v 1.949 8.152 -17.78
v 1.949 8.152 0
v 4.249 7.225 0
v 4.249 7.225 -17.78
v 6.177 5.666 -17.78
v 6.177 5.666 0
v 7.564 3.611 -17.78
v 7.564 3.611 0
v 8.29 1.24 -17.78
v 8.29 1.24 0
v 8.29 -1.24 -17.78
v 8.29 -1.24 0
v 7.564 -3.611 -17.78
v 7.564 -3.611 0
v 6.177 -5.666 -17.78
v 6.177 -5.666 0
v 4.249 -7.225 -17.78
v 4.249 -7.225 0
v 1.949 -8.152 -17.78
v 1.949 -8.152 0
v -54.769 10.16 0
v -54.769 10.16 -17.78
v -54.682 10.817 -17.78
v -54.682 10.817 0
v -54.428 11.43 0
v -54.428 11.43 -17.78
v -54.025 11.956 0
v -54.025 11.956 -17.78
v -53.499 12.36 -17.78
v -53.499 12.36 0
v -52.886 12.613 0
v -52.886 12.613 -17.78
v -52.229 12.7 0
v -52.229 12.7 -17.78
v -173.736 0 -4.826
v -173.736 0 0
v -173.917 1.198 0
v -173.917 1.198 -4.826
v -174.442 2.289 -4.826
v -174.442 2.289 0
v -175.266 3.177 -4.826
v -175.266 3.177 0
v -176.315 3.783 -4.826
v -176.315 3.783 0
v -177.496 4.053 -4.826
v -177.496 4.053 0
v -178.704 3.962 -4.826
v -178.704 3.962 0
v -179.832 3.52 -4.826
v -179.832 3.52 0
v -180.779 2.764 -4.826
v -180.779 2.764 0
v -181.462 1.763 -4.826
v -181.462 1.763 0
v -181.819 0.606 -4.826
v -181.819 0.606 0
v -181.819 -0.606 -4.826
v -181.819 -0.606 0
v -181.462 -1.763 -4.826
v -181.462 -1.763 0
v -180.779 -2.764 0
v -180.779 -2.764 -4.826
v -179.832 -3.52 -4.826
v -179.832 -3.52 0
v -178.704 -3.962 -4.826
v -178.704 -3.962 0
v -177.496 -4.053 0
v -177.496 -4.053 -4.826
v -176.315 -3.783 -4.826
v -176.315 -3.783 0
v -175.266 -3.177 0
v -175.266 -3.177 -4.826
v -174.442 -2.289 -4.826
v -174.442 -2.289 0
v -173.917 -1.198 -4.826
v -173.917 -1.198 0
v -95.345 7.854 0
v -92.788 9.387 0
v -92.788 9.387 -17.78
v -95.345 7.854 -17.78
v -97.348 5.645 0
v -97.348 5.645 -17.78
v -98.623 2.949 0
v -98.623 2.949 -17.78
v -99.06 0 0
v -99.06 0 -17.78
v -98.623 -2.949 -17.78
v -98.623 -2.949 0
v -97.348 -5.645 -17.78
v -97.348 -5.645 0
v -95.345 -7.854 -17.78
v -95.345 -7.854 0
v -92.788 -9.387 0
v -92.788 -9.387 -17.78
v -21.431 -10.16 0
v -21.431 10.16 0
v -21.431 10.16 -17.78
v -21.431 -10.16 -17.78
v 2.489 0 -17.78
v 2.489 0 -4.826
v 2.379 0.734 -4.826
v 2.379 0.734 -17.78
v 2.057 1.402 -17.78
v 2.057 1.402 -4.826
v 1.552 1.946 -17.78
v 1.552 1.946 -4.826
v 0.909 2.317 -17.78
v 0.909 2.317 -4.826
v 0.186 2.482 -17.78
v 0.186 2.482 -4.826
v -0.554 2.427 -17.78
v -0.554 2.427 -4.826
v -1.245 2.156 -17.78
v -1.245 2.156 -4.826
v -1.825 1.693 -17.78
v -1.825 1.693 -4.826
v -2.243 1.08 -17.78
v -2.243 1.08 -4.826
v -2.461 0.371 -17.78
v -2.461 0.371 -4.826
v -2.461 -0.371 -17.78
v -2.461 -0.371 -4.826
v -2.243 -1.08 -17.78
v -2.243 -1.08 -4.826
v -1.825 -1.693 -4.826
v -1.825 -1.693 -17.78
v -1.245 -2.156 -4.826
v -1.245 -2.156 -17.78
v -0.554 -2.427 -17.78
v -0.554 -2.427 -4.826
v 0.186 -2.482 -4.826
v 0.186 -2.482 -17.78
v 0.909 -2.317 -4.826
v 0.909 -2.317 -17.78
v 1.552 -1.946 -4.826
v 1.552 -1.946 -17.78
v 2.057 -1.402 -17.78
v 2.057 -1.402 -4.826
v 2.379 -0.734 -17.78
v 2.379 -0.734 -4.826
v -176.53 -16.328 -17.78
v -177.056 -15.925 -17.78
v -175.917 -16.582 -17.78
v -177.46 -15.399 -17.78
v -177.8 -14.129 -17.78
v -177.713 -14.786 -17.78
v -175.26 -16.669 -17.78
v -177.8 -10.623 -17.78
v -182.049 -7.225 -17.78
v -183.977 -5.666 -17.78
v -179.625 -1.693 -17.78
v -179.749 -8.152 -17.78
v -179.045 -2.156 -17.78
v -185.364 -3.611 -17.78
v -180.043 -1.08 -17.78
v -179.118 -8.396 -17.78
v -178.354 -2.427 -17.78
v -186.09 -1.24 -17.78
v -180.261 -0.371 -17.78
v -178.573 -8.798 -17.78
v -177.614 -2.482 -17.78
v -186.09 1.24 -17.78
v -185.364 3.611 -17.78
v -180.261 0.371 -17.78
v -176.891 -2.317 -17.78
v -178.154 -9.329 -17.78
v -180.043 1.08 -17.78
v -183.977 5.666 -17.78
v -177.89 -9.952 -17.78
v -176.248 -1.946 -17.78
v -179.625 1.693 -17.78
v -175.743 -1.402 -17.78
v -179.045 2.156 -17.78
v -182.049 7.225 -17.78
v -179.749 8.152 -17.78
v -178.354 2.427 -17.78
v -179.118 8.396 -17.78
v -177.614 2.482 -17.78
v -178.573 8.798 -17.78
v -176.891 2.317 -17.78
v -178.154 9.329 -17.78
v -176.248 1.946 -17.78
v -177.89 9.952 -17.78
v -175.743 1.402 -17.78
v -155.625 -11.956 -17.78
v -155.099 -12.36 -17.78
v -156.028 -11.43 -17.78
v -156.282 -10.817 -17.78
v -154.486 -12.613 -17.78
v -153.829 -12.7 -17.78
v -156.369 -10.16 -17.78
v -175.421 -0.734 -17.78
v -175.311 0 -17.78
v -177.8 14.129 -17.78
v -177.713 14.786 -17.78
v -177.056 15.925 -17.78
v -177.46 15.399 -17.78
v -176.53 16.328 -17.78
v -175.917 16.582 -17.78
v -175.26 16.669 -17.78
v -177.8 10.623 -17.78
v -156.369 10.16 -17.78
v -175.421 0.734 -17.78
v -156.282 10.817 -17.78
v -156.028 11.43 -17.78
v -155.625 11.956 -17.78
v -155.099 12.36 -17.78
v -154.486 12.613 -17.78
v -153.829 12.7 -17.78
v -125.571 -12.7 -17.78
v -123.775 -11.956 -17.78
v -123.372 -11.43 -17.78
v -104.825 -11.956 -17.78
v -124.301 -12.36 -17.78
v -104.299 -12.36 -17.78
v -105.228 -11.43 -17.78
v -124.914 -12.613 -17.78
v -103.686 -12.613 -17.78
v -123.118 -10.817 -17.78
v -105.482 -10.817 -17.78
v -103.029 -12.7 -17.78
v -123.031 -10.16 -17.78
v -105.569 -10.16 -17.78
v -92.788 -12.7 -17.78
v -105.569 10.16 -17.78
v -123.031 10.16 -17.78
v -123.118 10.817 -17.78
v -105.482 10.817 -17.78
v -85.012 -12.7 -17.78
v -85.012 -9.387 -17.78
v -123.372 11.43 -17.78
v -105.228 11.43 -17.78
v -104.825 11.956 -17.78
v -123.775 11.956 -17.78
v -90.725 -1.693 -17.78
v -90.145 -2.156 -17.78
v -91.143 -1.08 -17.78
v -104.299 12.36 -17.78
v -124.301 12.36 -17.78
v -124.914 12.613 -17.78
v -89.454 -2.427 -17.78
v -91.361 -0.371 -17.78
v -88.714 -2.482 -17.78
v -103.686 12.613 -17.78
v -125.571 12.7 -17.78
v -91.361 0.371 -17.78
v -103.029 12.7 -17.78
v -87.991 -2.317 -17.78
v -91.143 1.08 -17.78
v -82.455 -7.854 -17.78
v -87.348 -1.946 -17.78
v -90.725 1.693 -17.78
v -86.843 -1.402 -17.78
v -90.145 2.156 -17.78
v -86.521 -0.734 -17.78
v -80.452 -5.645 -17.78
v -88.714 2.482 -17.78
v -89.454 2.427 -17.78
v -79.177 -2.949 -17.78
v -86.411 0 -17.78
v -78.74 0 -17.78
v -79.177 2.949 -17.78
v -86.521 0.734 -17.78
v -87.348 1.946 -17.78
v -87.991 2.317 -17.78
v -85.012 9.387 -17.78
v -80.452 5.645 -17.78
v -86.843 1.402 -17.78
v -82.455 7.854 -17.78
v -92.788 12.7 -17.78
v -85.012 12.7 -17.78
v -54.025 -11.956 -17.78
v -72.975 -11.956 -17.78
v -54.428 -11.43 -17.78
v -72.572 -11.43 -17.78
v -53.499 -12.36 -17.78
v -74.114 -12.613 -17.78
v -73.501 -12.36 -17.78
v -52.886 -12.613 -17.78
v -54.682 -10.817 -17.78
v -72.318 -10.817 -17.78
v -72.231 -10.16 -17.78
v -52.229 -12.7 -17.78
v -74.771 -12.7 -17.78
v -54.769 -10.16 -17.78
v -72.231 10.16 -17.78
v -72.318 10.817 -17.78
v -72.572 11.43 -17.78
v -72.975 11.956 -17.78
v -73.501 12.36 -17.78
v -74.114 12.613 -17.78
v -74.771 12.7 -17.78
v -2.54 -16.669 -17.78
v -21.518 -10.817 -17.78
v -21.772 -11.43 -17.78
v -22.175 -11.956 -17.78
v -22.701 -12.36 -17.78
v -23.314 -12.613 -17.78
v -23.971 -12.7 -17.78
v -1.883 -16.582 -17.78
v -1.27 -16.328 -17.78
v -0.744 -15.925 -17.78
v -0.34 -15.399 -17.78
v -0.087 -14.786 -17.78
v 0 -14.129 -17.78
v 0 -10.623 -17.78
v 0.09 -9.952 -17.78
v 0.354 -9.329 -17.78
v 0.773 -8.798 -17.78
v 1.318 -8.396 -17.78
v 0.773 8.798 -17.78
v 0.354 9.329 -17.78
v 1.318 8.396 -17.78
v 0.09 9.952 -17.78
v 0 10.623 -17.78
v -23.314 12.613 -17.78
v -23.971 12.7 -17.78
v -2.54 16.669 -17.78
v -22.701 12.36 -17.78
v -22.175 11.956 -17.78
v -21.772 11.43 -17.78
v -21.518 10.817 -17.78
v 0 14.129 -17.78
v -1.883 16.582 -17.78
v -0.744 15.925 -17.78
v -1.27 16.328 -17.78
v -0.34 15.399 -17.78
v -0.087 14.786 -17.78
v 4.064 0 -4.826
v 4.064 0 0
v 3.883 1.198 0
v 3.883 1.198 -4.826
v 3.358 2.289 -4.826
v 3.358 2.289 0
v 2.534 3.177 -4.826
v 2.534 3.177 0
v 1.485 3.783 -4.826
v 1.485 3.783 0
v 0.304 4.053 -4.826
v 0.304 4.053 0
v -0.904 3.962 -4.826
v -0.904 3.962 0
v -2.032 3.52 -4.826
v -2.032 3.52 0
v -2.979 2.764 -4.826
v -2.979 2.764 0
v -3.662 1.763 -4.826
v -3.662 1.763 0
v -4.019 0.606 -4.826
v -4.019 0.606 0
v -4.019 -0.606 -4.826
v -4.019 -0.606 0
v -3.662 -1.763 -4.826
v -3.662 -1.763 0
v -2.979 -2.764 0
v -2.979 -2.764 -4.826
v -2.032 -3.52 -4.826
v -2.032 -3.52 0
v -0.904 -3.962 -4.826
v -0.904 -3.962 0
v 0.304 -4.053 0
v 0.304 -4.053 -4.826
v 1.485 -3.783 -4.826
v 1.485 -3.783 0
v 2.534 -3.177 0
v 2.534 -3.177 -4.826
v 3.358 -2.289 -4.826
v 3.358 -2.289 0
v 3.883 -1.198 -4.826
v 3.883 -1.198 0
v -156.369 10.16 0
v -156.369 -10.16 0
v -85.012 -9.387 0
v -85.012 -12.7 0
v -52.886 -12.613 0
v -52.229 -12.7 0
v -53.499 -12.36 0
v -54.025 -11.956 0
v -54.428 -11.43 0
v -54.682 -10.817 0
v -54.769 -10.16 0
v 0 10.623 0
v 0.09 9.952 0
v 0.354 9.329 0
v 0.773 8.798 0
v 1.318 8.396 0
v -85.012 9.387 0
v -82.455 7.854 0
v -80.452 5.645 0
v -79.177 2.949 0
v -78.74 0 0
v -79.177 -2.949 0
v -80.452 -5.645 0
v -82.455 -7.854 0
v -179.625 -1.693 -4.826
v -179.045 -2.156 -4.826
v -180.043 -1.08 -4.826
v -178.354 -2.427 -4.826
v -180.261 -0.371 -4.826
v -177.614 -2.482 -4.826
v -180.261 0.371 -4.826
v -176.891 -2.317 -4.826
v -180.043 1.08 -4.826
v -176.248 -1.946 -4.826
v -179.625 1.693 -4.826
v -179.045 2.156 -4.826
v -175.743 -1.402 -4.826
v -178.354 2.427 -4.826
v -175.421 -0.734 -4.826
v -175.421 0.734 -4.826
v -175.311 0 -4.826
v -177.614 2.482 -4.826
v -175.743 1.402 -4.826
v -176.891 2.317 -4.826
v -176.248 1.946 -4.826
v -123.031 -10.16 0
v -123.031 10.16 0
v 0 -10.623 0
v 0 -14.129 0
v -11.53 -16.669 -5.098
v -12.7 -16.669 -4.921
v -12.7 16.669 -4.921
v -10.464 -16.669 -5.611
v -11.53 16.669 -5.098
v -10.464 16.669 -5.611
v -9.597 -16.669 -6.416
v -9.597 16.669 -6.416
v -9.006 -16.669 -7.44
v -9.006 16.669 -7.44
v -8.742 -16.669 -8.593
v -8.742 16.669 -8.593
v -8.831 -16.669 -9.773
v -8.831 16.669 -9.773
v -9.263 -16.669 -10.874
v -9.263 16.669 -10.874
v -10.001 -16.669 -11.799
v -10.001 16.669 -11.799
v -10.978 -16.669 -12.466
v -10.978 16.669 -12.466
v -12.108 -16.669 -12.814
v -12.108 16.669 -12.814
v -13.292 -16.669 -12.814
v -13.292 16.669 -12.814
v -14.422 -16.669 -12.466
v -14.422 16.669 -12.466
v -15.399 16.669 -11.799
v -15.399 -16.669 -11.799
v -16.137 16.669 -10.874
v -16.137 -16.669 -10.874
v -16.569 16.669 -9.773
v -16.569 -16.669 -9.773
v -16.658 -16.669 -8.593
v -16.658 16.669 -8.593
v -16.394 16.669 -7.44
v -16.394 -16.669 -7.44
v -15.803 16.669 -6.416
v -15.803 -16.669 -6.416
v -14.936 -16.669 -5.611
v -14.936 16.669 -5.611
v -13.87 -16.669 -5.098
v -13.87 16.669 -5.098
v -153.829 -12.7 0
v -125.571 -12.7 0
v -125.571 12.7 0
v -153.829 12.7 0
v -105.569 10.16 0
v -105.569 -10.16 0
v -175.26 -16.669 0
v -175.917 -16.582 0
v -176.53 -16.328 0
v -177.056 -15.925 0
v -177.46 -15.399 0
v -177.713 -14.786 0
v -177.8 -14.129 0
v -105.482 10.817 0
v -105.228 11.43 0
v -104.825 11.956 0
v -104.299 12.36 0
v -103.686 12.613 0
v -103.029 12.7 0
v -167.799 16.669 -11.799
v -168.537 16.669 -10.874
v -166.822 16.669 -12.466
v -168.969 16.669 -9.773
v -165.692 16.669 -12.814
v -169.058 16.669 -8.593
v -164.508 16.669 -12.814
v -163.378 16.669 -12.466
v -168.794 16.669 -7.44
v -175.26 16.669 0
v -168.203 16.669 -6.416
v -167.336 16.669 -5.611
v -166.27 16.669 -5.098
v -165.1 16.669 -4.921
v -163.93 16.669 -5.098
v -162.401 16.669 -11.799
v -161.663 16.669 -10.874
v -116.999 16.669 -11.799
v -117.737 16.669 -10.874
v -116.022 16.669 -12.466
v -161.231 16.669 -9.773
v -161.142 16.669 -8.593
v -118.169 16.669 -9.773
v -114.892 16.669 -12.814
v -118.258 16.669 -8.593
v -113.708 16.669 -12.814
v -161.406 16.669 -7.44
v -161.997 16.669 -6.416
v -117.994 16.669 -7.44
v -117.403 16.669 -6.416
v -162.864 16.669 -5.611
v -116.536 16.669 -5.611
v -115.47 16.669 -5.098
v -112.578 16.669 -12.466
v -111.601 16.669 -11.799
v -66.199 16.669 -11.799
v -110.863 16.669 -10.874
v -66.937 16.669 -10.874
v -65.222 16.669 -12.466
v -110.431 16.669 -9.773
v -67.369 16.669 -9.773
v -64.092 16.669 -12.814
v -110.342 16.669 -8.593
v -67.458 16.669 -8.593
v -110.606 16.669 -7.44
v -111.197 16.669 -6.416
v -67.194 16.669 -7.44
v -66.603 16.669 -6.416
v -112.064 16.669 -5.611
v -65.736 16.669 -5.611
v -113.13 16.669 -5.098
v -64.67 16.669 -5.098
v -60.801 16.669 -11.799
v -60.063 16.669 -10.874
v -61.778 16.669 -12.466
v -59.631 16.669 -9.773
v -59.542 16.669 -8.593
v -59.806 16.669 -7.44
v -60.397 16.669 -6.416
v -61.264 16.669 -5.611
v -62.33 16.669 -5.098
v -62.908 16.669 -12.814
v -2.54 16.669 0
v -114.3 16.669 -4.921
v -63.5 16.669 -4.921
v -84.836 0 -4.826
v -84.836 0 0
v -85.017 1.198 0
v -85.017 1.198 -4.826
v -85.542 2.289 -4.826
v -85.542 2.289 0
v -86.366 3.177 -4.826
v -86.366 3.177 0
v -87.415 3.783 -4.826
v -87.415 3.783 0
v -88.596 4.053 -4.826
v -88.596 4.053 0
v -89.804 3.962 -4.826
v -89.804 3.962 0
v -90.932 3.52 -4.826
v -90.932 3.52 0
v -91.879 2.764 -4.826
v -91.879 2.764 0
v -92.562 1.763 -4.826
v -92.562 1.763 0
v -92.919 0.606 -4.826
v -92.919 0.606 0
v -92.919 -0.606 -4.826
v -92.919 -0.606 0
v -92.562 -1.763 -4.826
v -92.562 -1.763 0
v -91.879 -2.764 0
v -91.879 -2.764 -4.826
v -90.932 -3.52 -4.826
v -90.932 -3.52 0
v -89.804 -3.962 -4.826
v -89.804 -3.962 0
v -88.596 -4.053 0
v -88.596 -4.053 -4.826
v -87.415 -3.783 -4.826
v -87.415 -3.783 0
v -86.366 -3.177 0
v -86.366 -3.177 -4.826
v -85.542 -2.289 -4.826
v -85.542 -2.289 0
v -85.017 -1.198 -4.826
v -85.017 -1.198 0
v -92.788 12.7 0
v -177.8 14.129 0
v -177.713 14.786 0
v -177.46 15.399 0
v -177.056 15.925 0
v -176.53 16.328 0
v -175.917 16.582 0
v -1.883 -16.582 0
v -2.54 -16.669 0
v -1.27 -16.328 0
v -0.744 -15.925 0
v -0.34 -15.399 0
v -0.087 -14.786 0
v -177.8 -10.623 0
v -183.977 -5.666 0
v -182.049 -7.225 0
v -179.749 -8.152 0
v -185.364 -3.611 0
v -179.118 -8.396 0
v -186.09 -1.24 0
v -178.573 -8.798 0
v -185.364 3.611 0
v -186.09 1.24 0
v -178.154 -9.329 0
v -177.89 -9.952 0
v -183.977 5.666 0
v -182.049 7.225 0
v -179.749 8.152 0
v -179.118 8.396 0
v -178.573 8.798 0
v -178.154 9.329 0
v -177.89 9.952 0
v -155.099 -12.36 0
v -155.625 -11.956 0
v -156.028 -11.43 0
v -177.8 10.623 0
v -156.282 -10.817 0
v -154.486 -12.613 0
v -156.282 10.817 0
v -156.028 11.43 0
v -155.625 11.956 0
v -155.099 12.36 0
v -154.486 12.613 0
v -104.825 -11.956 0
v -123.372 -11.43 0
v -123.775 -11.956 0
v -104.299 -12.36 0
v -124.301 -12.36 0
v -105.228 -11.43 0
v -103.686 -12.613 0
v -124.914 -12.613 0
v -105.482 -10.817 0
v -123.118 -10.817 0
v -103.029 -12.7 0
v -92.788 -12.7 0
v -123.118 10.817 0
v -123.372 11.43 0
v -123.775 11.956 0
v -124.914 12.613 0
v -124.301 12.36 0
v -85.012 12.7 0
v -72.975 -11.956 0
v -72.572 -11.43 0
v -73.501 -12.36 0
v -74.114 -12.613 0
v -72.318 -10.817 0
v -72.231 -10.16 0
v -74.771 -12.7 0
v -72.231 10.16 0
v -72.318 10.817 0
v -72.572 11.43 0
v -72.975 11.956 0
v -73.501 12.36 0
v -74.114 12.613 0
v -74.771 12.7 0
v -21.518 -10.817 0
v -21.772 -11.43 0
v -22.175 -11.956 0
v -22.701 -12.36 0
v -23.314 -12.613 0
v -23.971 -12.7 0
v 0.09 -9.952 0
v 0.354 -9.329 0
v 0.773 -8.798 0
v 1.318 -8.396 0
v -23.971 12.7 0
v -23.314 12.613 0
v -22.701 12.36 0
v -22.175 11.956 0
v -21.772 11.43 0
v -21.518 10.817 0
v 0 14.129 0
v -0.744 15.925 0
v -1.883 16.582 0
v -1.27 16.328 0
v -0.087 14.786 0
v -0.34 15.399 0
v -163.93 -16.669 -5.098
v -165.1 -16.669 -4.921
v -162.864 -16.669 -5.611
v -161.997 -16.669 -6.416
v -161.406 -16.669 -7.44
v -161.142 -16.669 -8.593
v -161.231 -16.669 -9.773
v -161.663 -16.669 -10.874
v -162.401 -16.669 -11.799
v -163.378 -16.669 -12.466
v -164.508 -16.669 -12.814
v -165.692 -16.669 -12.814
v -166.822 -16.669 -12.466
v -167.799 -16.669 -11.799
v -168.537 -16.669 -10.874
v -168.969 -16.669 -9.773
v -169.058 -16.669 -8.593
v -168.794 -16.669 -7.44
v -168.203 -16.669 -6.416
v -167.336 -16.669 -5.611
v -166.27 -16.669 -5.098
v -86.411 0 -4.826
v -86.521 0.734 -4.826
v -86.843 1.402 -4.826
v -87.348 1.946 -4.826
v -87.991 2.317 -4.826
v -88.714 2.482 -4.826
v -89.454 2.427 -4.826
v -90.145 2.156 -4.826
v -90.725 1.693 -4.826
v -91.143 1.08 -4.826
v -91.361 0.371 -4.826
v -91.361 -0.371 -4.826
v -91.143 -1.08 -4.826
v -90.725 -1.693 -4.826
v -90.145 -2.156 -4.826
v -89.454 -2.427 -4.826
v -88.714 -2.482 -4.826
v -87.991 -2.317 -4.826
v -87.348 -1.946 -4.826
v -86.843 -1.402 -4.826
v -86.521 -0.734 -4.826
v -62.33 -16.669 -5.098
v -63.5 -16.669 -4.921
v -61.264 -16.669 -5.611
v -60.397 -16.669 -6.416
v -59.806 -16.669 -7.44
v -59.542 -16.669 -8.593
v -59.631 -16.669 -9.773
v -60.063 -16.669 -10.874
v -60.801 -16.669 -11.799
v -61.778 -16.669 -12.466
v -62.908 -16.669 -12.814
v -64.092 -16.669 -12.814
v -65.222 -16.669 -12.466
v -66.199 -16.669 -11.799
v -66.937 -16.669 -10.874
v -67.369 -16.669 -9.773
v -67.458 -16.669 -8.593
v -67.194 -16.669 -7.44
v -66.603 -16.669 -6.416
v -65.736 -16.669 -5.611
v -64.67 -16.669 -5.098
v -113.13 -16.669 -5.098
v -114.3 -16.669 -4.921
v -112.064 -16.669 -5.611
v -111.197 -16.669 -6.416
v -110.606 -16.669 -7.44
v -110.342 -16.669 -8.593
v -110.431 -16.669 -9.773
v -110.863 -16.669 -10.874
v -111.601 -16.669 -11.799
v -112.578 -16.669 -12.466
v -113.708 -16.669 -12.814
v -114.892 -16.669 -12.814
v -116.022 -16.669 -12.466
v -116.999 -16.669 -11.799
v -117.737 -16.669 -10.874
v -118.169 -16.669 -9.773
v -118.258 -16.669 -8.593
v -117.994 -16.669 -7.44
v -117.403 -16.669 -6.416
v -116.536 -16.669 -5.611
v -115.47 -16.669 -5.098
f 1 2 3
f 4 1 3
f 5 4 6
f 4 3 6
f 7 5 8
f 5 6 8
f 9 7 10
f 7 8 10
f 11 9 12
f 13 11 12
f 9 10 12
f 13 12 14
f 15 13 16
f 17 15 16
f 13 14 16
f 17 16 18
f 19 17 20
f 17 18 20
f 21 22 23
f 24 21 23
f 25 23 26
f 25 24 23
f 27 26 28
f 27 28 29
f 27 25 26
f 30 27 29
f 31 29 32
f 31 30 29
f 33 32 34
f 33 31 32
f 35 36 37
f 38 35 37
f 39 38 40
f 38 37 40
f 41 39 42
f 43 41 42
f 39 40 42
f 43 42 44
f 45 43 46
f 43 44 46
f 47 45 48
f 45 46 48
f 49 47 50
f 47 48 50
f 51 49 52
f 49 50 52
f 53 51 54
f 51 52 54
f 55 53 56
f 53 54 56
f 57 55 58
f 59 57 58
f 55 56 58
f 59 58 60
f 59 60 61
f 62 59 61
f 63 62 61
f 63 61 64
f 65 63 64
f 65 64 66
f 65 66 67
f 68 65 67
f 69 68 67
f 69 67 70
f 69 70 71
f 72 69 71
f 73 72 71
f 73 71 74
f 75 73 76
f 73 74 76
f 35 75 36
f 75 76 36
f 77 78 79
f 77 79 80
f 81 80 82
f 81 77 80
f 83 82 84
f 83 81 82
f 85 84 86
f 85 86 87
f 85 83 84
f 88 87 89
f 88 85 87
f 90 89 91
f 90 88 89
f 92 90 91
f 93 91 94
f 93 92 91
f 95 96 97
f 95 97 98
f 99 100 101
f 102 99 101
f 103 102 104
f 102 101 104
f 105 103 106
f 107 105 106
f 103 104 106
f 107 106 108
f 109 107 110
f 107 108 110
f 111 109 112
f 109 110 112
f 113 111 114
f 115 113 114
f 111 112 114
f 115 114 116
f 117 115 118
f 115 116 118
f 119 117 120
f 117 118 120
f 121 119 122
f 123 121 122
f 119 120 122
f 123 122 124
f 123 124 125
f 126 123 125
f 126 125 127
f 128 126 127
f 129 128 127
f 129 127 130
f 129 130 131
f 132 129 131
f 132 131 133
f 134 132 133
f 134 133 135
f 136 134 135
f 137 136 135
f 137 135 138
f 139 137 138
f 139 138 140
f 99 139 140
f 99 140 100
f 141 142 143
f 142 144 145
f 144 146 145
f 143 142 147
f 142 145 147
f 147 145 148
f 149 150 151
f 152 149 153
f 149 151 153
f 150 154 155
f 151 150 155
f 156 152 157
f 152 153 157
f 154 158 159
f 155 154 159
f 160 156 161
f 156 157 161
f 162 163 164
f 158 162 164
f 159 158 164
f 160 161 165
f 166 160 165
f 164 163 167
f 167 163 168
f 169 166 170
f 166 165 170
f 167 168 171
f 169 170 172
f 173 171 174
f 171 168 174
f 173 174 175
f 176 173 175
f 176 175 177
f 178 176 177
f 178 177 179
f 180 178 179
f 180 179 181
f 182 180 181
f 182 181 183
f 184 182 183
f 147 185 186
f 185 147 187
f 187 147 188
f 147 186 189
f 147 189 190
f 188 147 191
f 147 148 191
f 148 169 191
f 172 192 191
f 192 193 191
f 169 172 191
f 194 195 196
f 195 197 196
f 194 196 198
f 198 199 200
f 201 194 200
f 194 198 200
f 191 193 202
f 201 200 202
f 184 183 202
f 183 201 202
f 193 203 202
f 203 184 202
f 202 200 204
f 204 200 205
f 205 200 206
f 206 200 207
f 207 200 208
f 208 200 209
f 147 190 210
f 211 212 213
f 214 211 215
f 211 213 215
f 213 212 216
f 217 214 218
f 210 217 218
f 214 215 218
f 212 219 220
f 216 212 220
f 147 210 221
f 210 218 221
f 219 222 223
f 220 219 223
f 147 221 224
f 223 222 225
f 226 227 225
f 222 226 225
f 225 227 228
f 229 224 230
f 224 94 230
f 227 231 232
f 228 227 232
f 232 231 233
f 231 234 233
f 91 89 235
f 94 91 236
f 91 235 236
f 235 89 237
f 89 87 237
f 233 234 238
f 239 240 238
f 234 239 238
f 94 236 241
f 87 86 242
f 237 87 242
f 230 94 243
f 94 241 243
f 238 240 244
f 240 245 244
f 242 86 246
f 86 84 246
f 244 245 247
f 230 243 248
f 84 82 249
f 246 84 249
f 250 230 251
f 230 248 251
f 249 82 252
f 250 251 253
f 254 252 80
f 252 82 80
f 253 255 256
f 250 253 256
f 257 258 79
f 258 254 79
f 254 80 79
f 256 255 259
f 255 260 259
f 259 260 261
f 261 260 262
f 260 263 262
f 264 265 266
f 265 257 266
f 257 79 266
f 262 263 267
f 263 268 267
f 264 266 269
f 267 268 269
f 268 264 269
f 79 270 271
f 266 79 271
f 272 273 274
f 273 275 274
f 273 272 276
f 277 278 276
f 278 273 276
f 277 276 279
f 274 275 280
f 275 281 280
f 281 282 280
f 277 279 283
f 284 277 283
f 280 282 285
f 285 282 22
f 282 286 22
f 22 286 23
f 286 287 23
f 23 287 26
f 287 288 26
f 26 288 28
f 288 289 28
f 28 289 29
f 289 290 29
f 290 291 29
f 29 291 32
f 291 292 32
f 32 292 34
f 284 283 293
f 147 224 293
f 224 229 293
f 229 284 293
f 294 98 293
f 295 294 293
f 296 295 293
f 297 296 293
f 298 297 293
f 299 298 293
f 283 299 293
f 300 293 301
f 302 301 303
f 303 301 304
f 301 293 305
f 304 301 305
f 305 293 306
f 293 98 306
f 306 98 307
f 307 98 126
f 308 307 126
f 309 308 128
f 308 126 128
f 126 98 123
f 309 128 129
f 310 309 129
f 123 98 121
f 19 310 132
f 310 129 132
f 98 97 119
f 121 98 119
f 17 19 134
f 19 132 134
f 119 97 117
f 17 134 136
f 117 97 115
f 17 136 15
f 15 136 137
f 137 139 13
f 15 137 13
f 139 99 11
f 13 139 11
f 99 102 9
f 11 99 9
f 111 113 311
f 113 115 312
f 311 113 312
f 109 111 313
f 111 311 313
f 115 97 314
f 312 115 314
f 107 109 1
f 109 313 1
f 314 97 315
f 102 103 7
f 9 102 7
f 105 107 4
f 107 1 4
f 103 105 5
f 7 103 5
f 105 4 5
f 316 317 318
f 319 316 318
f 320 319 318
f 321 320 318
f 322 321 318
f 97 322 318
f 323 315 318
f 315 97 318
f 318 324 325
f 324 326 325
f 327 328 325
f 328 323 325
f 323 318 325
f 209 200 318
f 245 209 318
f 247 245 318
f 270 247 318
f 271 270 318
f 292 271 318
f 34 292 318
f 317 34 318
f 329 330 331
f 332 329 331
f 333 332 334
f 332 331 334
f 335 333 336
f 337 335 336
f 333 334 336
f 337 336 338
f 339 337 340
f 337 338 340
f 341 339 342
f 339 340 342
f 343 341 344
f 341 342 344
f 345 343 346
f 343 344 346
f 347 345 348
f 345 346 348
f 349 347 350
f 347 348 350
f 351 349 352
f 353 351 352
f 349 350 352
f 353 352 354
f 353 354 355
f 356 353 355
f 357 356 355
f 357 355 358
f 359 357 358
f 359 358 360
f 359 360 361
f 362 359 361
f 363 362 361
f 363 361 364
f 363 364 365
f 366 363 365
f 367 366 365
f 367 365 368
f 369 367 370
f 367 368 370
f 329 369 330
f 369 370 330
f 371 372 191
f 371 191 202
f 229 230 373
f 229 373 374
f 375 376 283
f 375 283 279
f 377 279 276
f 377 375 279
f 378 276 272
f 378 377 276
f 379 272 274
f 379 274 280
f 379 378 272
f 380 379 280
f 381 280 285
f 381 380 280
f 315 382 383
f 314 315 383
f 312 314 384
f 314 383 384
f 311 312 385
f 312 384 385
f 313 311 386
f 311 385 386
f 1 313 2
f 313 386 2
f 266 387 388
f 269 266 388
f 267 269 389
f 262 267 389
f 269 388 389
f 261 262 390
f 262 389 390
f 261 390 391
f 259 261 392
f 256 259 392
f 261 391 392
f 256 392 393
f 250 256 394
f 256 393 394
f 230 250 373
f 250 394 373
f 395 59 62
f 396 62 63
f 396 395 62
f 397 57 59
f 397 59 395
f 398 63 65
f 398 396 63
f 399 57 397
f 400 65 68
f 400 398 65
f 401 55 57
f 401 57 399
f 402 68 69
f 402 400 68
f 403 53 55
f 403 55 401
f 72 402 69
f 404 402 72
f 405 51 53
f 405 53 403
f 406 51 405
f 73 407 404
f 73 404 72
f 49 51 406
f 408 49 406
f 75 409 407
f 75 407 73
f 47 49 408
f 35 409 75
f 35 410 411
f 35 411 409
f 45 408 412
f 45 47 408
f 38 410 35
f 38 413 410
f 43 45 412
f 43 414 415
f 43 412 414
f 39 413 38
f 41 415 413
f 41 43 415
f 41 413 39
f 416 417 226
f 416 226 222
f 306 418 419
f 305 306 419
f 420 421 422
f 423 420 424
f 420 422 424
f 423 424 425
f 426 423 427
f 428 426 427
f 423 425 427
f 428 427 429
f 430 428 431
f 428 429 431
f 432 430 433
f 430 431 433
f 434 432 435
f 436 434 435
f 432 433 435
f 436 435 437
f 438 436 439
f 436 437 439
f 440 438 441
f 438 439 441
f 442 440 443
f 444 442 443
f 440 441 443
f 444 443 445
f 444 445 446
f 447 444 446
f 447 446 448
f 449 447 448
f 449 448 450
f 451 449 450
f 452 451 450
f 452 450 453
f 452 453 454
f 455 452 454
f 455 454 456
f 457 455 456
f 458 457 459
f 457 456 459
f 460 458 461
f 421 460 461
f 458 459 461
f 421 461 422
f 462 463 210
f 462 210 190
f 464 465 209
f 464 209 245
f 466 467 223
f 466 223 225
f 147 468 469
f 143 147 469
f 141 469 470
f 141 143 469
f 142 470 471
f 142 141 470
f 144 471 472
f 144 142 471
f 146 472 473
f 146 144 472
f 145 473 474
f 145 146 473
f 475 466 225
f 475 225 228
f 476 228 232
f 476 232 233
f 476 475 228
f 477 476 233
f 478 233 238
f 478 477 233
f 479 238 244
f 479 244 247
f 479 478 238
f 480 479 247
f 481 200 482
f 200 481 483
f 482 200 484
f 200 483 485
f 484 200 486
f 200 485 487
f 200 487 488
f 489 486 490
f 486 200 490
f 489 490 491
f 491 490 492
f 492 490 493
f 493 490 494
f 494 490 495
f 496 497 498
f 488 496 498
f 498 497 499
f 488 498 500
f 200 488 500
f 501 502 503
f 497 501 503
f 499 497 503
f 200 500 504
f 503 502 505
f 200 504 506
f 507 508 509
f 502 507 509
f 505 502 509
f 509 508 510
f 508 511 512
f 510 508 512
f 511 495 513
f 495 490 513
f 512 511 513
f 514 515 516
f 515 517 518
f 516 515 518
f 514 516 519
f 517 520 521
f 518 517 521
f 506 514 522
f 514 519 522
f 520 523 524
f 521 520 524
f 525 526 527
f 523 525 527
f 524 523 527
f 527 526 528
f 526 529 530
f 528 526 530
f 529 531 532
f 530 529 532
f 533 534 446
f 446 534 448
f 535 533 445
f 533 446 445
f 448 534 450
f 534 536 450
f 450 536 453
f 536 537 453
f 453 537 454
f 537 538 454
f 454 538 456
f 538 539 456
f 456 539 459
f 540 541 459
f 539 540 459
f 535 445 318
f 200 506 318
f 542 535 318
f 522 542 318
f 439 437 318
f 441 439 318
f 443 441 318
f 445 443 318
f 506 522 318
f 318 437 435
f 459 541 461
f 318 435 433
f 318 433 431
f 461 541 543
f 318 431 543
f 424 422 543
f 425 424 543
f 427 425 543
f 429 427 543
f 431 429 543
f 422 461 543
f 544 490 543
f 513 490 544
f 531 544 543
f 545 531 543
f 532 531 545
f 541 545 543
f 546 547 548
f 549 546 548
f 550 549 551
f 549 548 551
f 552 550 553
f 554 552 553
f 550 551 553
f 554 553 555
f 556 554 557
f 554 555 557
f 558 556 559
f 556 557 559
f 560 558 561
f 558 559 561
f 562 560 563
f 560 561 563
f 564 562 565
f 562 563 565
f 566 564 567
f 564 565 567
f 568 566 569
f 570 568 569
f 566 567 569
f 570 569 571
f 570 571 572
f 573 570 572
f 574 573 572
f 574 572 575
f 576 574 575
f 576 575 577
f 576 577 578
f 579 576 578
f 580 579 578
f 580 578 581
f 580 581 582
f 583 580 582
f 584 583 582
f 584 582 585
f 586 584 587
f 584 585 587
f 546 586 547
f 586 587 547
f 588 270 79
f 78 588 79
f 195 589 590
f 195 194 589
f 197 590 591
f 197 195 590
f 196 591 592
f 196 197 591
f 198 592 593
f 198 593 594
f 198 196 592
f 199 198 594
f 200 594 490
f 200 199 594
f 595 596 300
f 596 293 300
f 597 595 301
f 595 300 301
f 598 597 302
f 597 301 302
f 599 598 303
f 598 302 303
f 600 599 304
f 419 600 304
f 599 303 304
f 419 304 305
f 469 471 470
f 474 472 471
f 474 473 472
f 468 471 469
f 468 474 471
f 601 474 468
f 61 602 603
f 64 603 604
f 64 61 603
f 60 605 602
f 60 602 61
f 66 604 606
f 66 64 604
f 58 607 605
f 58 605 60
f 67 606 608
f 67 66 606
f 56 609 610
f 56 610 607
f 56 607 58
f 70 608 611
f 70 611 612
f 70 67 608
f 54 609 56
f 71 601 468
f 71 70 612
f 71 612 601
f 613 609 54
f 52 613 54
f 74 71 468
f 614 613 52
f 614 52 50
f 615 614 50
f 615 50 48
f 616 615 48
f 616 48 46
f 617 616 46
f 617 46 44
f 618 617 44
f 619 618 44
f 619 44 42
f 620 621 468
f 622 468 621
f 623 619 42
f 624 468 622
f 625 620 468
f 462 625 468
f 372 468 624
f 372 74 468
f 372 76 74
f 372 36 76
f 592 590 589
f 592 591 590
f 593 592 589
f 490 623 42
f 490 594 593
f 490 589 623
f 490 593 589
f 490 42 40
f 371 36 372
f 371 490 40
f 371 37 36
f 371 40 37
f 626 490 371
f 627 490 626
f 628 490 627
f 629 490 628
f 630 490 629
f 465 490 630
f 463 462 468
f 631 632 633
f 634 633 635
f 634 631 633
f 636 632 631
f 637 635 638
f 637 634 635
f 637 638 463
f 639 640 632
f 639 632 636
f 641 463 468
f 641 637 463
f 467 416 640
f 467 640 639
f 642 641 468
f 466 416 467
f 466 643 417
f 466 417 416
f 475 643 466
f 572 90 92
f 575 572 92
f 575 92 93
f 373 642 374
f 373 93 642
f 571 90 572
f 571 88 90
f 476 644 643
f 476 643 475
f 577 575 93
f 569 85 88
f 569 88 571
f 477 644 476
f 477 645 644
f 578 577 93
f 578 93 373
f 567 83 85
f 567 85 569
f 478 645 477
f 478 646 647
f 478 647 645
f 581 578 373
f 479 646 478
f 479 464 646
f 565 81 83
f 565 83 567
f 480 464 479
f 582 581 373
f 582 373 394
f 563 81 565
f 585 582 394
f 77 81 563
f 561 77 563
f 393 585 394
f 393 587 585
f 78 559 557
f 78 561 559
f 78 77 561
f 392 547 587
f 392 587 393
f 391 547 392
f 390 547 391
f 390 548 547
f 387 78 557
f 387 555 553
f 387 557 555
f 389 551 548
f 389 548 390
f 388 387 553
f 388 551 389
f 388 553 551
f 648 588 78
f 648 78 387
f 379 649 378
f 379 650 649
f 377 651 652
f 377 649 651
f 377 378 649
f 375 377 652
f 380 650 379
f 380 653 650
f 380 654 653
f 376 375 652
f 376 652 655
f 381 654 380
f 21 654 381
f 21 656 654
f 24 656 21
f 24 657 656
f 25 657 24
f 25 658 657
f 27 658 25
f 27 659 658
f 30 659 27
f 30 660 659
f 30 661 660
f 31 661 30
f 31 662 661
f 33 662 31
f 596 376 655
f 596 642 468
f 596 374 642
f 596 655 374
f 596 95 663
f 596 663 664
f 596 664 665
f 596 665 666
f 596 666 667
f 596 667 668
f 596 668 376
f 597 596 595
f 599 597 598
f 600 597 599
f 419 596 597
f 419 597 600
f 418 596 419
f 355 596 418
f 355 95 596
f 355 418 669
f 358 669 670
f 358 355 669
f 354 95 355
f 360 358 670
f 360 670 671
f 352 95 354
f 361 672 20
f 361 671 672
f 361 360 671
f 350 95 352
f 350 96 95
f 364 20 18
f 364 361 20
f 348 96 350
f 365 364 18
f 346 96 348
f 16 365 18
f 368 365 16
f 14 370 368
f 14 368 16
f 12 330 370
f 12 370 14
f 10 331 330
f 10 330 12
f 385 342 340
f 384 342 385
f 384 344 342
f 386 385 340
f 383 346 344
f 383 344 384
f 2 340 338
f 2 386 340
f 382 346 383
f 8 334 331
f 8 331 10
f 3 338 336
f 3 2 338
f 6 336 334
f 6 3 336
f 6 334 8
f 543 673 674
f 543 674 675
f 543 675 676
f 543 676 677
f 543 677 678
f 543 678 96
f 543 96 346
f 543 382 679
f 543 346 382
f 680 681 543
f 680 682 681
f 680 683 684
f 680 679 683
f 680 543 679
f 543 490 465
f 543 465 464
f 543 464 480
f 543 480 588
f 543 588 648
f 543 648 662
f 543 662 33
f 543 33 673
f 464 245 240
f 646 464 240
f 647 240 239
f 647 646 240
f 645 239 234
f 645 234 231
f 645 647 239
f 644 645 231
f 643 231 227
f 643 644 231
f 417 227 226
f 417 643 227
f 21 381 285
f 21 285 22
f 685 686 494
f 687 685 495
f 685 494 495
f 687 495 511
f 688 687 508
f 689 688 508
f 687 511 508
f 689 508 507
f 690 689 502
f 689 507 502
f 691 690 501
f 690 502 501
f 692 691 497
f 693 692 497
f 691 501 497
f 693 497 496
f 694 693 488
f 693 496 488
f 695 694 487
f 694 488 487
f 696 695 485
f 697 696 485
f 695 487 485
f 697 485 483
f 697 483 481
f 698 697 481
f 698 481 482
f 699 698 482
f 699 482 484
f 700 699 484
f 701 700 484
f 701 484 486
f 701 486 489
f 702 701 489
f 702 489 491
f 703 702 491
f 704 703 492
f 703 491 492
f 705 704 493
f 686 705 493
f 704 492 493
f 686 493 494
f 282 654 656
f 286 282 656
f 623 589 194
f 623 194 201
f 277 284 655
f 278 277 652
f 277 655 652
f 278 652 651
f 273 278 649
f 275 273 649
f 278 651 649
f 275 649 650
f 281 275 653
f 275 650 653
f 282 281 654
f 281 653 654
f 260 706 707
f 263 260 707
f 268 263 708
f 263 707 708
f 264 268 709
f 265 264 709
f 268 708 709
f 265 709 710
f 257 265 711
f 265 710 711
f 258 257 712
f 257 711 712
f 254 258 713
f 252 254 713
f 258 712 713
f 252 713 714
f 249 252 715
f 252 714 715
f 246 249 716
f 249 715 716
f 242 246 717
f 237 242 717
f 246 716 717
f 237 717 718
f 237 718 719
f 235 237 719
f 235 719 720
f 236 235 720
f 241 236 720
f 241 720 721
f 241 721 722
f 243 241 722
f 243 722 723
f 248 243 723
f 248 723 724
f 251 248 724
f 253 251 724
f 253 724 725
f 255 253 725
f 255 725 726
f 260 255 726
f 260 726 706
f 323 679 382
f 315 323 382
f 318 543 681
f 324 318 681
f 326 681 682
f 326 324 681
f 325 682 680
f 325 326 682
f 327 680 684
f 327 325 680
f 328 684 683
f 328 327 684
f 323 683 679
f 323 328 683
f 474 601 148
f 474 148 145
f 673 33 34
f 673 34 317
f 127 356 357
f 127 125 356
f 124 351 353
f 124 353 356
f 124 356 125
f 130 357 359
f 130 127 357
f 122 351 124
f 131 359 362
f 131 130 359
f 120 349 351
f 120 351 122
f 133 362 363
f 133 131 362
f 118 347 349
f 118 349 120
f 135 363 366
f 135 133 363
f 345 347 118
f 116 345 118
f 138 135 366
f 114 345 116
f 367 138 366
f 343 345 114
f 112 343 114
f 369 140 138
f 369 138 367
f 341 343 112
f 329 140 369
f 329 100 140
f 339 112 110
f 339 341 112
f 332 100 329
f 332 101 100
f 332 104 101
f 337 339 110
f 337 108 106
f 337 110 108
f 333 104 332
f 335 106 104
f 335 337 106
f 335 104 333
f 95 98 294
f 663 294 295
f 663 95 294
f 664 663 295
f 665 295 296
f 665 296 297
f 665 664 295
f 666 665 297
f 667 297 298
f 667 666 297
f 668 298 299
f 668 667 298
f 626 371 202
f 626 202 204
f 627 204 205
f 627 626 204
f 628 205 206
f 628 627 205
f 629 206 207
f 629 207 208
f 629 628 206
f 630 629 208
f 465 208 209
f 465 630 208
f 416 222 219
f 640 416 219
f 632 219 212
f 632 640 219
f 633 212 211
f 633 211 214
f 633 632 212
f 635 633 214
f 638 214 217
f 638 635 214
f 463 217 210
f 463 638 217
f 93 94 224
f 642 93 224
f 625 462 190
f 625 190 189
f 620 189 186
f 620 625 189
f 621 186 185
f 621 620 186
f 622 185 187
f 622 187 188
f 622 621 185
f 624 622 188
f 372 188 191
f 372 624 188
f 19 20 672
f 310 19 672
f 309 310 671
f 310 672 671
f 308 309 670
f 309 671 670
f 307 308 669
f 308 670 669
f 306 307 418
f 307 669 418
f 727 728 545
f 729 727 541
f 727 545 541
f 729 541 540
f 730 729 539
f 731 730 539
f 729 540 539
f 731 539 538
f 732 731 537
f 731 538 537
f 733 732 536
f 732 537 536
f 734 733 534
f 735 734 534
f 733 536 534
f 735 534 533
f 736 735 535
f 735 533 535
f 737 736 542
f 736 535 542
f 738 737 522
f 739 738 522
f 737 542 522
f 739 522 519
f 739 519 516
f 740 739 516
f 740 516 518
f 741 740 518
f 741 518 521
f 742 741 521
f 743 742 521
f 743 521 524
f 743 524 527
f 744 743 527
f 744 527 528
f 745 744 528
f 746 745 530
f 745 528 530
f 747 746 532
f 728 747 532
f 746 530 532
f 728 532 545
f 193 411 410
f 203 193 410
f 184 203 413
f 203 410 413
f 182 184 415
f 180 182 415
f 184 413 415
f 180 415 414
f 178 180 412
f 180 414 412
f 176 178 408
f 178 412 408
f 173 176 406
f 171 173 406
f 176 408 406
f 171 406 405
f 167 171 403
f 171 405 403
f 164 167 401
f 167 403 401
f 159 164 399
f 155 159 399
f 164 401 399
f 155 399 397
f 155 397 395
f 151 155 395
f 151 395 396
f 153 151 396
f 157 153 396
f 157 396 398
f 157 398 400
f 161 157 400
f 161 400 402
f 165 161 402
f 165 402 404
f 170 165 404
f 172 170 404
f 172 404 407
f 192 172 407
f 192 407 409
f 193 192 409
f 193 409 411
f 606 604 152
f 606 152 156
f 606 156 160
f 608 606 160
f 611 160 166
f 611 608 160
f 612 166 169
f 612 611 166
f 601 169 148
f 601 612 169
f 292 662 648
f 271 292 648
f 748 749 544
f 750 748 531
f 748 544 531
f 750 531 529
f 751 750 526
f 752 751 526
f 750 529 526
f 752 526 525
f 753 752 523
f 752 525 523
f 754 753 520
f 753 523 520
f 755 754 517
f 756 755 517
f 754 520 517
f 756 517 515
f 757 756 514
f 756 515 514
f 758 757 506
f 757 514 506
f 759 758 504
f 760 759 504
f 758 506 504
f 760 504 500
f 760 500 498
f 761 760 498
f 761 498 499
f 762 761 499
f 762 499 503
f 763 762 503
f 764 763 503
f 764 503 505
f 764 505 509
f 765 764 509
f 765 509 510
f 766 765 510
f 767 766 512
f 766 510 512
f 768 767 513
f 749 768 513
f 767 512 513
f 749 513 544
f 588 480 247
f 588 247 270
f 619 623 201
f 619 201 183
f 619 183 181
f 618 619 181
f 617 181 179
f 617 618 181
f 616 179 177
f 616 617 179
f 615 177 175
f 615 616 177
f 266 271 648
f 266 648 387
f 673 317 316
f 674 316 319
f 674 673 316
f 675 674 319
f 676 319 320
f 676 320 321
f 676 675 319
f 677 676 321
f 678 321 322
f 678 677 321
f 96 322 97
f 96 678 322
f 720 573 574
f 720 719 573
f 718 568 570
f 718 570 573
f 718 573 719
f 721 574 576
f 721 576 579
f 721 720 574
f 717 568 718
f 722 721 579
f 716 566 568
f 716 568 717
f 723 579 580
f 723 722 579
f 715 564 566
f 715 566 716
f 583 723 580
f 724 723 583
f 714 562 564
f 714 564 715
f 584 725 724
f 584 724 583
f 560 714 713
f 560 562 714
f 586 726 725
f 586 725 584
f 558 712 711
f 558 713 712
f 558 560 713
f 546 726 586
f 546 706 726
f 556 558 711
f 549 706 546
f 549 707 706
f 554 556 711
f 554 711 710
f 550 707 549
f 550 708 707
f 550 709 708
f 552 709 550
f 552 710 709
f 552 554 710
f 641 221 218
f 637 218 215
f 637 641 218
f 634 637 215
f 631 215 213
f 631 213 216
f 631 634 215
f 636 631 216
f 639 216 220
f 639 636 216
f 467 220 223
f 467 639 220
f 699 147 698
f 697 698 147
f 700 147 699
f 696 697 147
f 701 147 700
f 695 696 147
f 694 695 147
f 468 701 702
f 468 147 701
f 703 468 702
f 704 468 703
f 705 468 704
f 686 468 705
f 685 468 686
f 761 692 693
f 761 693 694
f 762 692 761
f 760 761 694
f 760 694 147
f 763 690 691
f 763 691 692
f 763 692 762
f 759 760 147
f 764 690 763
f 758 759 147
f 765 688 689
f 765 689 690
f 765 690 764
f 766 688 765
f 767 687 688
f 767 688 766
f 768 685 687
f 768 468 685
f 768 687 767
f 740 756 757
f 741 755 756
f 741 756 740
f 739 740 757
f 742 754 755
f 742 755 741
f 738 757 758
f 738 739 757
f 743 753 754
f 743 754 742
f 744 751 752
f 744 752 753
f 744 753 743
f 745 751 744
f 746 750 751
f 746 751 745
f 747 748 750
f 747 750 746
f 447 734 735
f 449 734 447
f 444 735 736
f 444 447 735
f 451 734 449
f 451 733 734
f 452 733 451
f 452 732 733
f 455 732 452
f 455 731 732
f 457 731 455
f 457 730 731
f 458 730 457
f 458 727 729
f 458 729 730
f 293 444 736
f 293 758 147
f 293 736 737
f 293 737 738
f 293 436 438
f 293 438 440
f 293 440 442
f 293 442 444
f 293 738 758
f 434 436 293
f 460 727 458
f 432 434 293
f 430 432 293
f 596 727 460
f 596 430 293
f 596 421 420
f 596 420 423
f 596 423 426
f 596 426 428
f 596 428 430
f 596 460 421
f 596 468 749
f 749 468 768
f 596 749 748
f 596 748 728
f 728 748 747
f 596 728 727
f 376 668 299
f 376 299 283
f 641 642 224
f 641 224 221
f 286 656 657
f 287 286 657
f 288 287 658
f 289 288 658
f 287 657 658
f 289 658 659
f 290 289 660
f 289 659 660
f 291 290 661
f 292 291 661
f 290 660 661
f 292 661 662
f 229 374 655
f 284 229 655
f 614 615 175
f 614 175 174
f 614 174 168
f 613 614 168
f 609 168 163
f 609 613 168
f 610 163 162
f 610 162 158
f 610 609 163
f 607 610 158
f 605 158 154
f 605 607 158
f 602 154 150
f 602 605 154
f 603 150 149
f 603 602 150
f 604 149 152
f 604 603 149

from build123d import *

# Parameters (mm, degrees)
SKETCH1_W           = 195.2625
SKETCH1_H           = 33.3375
SKETCH1_R           = 2.4892
BOSS_EXTRUDE1_DEPTH = 17.78
SKETCH2_R           = 3.96875
CUT_EXTRUDE1_DEPTH  = 33.3375
SKETCH3_R           = 4.064
CUT_EXTRUDE2_DEPTH  = 4.826
CUT_EXTRUDE3_DEPTH  = 17.78
FILLET1_R           = 2.54


with BuildPart() as part:
    # Sketch1 → Boss-Extrude1 (new body)
    with BuildSketch(Plane.XY):
        with Locations((-88.9, 0)):
            Rectangle(SKETCH1_W, SKETCH1_H)
        Circle(SKETCH1_R, mode=Mode.SUBTRACT)
        with Locations((-177.8, 0)):
            Circle(SKETCH1_R, mode=Mode.SUBTRACT)
        with Locations((-88.9, 0)):
            Circle(SKETCH1_R, mode=Mode.SUBTRACT)
    extrude(amount=-BOSS_EXTRUDE1_DEPTH)

    # Sketch2 → Cut-Extrude1 (cut)
    with BuildSketch(Plane(origin=(0, 16.66875, 0), x_dir=(1, 0, 0), z_dir=(0, 1, 0))):
        with Locations(Location((-12.7, 8.89, 0), (0, 0, 270))):
            Circle(SKETCH2_R)
        with Locations(Location((-63.5, 8.89, 0), (0, 0, 270))):
            Circle(SKETCH2_R)
        with Locations(Location((-114.3, 8.89, 0), (0, 0, 270))):
            Circle(SKETCH2_R)
        with Locations(Location((-165.1, 8.89, 0), (0, 0, 270))):
            Circle(SKETCH2_R)
    extrude(amount=-CUT_EXTRUDE1_DEPTH, mode=Mode.SUBTRACT)

    # Sketch3 → Cut-Extrude2 (cut)
    with BuildSketch(Plane.XY):
        Circle(SKETCH3_R)
        with Locations((-88.9, 0)):
            Circle(SKETCH3_R)
        with Locations((-177.8, 0)):
            Circle(SKETCH3_R)
    extrude(amount=-CUT_EXTRUDE2_DEPTH, mode=Mode.SUBTRACT)

    # Sketch5 → Cut-Extrude3 (cut)
    with BuildSketch(Plane.XY):
        with BuildLine():
            Line((0, -16.66875), (8.73125, -16.66875))
            Line((8.73125, -16.66875), (8.73125, 16.66875))
            Line((8.73125, 16.66875), (0, 16.66875))
            Line((0, 16.66875), (0, 10.622546022))
            ThreePointArc((0, 10.622546022), (0.546012526, 9.049137635), (1.949302326, 8.152186482))
            ThreePointArc((1.949302326, 8.152186482), (8.382, 0), (1.949302326, -8.152186482))
            ThreePointArc((1.949302326, -8.152186482), (0.546012526, -9.049137635), (0, -10.622546022))
            Line((0, -10.622546022), (0, -16.66875))
        make_face()
        with BuildLine():
            Line((-23.97125, -12.7), (-52.22875, -12.7))
            ThreePointArc((-52.22875, -12.7), (-54.024801224, -11.956051224), (-54.76875, -10.16))
            Line((-54.76875, -10.16), (-54.76875, 10.16))
            ThreePointArc((-54.76875, 10.16), (-54.024801224, 11.956051224), (-52.22875, 12.7))
            Line((-52.22875, 12.7), (-23.97125, 12.7))
            ThreePointArc((-23.97125, 12.7), (-22.175198776, 11.956051224), (-21.43125, 10.16))
            Line((-21.43125, 10.16), (-21.43125, -10.16))
            ThreePointArc((-21.43125, -10.16), (-22.175198776, -11.956051224), (-23.97125, -12.7))
        make_face()
        with BuildLine():
            Line((-85.011936327, -9.38661605), (-85.011936327, -12.7))
            Line((-85.011936327, -12.7), (-74.77125, -12.7))
            ThreePointArc((-74.77125, -12.7), (-72.975198776, -11.956051224), (-72.23125, -10.16))
            Line((-72.23125, -10.16), (-72.23125, 10.16))
            ThreePointArc((-72.23125, 10.16), (-72.975198776, 11.956051224), (-74.77125, 12.7))
            Line((-74.77125, 12.7), (-85.011936327, 12.7))
            Line((-85.011936327, 12.7), (-85.011936327, 9.38661605))
            ThreePointArc((-85.011936327, 9.38661605), (-78.74, 0), (-85.011936327, -9.38661605))
        make_face()
        with BuildLine():
            Line((-103.02875, 12.7), (-92.788063673, 12.7))
            Line((-92.788063673, 12.7), (-92.788063673, 9.38661605))
            ThreePointArc((-92.788063673, 9.38661605), (-99.06, 0), (-92.788063673, -9.38661605))
            Line((-92.788063673, -9.38661605), (-92.788063673, -12.7))
            Line((-92.788063673, -12.7), (-103.02875, -12.7))
            ThreePointArc((-103.02875, -12.7), (-104.824801224, -11.956051224), (-105.56875, -10.16))
            Line((-105.56875, -10.16), (-105.56875, 10.16))
            ThreePointArc((-105.56875, 10.16), (-104.824801224, 11.956051224), (-103.02875, 12.7))
        make_face()
        with BuildLine():
            Line((-153.82875, 12.7), (-125.57125, 12.7))
            ThreePointArc((-125.57125, 12.7), (-123.775198776, 11.956051224), (-123.03125, 10.16))
            Line((-123.03125, 10.16), (-123.03125, -10.16))
            ThreePointArc((-123.03125, -10.16), (-123.775198776, -11.956051224), (-125.57125, -12.7))
            Line((-125.57125, -12.7), (-153.82875, -12.7))
            ThreePointArc((-153.82875, -12.7), (-155.624801224, -11.956051224), (-156.36875, -10.16))
            Line((-156.36875, -10.16), (-156.36875, 10.16))
            ThreePointArc((-156.36875, 10.16), (-155.624801224, 11.956051224), (-153.82875, 12.7))
        make_face()
        with BuildLine():
            Line((-186.53125, -16.66875), (-186.53125, 16.66875))
            Line((-186.53125, 16.66875), (-177.8, 16.66875))
            Line((-177.8, 16.66875), (-177.8, 10.622546022))
            ThreePointArc((-177.8, 10.622546022), (-178.346012526, 9.049137635), (-179.749302326, 8.152186482))
            ThreePointArc((-179.749302326, 8.152186482), (-186.182, 0), (-179.749302326, -8.152186482))
            ThreePointArc((-179.749302326, -8.152186482), (-178.346012526, -9.049137635), (-177.8, -10.622546022))
            Line((-177.8, -10.622546022), (-177.8, -16.66875))
            Line((-177.8, -16.66875), (-186.53125, -16.66875))
        make_face()
    extrude(amount=-CUT_EXTRUDE3_DEPTH, mode=Mode.SUBTRACT)

    # Fillet1
    fillet1_edges = [part.edges().sort_by_distance(p)[0] for p in [
        (0, 16.66875, -8.89),
        (0, -16.66875, -8.89),
        (-177.8, -16.66875, -8.89),
        (-177.8, 16.66875, -8.89),
    ]]
    fillet(fillet1_edges, radius=FILLET1_R)


solid = part.part
